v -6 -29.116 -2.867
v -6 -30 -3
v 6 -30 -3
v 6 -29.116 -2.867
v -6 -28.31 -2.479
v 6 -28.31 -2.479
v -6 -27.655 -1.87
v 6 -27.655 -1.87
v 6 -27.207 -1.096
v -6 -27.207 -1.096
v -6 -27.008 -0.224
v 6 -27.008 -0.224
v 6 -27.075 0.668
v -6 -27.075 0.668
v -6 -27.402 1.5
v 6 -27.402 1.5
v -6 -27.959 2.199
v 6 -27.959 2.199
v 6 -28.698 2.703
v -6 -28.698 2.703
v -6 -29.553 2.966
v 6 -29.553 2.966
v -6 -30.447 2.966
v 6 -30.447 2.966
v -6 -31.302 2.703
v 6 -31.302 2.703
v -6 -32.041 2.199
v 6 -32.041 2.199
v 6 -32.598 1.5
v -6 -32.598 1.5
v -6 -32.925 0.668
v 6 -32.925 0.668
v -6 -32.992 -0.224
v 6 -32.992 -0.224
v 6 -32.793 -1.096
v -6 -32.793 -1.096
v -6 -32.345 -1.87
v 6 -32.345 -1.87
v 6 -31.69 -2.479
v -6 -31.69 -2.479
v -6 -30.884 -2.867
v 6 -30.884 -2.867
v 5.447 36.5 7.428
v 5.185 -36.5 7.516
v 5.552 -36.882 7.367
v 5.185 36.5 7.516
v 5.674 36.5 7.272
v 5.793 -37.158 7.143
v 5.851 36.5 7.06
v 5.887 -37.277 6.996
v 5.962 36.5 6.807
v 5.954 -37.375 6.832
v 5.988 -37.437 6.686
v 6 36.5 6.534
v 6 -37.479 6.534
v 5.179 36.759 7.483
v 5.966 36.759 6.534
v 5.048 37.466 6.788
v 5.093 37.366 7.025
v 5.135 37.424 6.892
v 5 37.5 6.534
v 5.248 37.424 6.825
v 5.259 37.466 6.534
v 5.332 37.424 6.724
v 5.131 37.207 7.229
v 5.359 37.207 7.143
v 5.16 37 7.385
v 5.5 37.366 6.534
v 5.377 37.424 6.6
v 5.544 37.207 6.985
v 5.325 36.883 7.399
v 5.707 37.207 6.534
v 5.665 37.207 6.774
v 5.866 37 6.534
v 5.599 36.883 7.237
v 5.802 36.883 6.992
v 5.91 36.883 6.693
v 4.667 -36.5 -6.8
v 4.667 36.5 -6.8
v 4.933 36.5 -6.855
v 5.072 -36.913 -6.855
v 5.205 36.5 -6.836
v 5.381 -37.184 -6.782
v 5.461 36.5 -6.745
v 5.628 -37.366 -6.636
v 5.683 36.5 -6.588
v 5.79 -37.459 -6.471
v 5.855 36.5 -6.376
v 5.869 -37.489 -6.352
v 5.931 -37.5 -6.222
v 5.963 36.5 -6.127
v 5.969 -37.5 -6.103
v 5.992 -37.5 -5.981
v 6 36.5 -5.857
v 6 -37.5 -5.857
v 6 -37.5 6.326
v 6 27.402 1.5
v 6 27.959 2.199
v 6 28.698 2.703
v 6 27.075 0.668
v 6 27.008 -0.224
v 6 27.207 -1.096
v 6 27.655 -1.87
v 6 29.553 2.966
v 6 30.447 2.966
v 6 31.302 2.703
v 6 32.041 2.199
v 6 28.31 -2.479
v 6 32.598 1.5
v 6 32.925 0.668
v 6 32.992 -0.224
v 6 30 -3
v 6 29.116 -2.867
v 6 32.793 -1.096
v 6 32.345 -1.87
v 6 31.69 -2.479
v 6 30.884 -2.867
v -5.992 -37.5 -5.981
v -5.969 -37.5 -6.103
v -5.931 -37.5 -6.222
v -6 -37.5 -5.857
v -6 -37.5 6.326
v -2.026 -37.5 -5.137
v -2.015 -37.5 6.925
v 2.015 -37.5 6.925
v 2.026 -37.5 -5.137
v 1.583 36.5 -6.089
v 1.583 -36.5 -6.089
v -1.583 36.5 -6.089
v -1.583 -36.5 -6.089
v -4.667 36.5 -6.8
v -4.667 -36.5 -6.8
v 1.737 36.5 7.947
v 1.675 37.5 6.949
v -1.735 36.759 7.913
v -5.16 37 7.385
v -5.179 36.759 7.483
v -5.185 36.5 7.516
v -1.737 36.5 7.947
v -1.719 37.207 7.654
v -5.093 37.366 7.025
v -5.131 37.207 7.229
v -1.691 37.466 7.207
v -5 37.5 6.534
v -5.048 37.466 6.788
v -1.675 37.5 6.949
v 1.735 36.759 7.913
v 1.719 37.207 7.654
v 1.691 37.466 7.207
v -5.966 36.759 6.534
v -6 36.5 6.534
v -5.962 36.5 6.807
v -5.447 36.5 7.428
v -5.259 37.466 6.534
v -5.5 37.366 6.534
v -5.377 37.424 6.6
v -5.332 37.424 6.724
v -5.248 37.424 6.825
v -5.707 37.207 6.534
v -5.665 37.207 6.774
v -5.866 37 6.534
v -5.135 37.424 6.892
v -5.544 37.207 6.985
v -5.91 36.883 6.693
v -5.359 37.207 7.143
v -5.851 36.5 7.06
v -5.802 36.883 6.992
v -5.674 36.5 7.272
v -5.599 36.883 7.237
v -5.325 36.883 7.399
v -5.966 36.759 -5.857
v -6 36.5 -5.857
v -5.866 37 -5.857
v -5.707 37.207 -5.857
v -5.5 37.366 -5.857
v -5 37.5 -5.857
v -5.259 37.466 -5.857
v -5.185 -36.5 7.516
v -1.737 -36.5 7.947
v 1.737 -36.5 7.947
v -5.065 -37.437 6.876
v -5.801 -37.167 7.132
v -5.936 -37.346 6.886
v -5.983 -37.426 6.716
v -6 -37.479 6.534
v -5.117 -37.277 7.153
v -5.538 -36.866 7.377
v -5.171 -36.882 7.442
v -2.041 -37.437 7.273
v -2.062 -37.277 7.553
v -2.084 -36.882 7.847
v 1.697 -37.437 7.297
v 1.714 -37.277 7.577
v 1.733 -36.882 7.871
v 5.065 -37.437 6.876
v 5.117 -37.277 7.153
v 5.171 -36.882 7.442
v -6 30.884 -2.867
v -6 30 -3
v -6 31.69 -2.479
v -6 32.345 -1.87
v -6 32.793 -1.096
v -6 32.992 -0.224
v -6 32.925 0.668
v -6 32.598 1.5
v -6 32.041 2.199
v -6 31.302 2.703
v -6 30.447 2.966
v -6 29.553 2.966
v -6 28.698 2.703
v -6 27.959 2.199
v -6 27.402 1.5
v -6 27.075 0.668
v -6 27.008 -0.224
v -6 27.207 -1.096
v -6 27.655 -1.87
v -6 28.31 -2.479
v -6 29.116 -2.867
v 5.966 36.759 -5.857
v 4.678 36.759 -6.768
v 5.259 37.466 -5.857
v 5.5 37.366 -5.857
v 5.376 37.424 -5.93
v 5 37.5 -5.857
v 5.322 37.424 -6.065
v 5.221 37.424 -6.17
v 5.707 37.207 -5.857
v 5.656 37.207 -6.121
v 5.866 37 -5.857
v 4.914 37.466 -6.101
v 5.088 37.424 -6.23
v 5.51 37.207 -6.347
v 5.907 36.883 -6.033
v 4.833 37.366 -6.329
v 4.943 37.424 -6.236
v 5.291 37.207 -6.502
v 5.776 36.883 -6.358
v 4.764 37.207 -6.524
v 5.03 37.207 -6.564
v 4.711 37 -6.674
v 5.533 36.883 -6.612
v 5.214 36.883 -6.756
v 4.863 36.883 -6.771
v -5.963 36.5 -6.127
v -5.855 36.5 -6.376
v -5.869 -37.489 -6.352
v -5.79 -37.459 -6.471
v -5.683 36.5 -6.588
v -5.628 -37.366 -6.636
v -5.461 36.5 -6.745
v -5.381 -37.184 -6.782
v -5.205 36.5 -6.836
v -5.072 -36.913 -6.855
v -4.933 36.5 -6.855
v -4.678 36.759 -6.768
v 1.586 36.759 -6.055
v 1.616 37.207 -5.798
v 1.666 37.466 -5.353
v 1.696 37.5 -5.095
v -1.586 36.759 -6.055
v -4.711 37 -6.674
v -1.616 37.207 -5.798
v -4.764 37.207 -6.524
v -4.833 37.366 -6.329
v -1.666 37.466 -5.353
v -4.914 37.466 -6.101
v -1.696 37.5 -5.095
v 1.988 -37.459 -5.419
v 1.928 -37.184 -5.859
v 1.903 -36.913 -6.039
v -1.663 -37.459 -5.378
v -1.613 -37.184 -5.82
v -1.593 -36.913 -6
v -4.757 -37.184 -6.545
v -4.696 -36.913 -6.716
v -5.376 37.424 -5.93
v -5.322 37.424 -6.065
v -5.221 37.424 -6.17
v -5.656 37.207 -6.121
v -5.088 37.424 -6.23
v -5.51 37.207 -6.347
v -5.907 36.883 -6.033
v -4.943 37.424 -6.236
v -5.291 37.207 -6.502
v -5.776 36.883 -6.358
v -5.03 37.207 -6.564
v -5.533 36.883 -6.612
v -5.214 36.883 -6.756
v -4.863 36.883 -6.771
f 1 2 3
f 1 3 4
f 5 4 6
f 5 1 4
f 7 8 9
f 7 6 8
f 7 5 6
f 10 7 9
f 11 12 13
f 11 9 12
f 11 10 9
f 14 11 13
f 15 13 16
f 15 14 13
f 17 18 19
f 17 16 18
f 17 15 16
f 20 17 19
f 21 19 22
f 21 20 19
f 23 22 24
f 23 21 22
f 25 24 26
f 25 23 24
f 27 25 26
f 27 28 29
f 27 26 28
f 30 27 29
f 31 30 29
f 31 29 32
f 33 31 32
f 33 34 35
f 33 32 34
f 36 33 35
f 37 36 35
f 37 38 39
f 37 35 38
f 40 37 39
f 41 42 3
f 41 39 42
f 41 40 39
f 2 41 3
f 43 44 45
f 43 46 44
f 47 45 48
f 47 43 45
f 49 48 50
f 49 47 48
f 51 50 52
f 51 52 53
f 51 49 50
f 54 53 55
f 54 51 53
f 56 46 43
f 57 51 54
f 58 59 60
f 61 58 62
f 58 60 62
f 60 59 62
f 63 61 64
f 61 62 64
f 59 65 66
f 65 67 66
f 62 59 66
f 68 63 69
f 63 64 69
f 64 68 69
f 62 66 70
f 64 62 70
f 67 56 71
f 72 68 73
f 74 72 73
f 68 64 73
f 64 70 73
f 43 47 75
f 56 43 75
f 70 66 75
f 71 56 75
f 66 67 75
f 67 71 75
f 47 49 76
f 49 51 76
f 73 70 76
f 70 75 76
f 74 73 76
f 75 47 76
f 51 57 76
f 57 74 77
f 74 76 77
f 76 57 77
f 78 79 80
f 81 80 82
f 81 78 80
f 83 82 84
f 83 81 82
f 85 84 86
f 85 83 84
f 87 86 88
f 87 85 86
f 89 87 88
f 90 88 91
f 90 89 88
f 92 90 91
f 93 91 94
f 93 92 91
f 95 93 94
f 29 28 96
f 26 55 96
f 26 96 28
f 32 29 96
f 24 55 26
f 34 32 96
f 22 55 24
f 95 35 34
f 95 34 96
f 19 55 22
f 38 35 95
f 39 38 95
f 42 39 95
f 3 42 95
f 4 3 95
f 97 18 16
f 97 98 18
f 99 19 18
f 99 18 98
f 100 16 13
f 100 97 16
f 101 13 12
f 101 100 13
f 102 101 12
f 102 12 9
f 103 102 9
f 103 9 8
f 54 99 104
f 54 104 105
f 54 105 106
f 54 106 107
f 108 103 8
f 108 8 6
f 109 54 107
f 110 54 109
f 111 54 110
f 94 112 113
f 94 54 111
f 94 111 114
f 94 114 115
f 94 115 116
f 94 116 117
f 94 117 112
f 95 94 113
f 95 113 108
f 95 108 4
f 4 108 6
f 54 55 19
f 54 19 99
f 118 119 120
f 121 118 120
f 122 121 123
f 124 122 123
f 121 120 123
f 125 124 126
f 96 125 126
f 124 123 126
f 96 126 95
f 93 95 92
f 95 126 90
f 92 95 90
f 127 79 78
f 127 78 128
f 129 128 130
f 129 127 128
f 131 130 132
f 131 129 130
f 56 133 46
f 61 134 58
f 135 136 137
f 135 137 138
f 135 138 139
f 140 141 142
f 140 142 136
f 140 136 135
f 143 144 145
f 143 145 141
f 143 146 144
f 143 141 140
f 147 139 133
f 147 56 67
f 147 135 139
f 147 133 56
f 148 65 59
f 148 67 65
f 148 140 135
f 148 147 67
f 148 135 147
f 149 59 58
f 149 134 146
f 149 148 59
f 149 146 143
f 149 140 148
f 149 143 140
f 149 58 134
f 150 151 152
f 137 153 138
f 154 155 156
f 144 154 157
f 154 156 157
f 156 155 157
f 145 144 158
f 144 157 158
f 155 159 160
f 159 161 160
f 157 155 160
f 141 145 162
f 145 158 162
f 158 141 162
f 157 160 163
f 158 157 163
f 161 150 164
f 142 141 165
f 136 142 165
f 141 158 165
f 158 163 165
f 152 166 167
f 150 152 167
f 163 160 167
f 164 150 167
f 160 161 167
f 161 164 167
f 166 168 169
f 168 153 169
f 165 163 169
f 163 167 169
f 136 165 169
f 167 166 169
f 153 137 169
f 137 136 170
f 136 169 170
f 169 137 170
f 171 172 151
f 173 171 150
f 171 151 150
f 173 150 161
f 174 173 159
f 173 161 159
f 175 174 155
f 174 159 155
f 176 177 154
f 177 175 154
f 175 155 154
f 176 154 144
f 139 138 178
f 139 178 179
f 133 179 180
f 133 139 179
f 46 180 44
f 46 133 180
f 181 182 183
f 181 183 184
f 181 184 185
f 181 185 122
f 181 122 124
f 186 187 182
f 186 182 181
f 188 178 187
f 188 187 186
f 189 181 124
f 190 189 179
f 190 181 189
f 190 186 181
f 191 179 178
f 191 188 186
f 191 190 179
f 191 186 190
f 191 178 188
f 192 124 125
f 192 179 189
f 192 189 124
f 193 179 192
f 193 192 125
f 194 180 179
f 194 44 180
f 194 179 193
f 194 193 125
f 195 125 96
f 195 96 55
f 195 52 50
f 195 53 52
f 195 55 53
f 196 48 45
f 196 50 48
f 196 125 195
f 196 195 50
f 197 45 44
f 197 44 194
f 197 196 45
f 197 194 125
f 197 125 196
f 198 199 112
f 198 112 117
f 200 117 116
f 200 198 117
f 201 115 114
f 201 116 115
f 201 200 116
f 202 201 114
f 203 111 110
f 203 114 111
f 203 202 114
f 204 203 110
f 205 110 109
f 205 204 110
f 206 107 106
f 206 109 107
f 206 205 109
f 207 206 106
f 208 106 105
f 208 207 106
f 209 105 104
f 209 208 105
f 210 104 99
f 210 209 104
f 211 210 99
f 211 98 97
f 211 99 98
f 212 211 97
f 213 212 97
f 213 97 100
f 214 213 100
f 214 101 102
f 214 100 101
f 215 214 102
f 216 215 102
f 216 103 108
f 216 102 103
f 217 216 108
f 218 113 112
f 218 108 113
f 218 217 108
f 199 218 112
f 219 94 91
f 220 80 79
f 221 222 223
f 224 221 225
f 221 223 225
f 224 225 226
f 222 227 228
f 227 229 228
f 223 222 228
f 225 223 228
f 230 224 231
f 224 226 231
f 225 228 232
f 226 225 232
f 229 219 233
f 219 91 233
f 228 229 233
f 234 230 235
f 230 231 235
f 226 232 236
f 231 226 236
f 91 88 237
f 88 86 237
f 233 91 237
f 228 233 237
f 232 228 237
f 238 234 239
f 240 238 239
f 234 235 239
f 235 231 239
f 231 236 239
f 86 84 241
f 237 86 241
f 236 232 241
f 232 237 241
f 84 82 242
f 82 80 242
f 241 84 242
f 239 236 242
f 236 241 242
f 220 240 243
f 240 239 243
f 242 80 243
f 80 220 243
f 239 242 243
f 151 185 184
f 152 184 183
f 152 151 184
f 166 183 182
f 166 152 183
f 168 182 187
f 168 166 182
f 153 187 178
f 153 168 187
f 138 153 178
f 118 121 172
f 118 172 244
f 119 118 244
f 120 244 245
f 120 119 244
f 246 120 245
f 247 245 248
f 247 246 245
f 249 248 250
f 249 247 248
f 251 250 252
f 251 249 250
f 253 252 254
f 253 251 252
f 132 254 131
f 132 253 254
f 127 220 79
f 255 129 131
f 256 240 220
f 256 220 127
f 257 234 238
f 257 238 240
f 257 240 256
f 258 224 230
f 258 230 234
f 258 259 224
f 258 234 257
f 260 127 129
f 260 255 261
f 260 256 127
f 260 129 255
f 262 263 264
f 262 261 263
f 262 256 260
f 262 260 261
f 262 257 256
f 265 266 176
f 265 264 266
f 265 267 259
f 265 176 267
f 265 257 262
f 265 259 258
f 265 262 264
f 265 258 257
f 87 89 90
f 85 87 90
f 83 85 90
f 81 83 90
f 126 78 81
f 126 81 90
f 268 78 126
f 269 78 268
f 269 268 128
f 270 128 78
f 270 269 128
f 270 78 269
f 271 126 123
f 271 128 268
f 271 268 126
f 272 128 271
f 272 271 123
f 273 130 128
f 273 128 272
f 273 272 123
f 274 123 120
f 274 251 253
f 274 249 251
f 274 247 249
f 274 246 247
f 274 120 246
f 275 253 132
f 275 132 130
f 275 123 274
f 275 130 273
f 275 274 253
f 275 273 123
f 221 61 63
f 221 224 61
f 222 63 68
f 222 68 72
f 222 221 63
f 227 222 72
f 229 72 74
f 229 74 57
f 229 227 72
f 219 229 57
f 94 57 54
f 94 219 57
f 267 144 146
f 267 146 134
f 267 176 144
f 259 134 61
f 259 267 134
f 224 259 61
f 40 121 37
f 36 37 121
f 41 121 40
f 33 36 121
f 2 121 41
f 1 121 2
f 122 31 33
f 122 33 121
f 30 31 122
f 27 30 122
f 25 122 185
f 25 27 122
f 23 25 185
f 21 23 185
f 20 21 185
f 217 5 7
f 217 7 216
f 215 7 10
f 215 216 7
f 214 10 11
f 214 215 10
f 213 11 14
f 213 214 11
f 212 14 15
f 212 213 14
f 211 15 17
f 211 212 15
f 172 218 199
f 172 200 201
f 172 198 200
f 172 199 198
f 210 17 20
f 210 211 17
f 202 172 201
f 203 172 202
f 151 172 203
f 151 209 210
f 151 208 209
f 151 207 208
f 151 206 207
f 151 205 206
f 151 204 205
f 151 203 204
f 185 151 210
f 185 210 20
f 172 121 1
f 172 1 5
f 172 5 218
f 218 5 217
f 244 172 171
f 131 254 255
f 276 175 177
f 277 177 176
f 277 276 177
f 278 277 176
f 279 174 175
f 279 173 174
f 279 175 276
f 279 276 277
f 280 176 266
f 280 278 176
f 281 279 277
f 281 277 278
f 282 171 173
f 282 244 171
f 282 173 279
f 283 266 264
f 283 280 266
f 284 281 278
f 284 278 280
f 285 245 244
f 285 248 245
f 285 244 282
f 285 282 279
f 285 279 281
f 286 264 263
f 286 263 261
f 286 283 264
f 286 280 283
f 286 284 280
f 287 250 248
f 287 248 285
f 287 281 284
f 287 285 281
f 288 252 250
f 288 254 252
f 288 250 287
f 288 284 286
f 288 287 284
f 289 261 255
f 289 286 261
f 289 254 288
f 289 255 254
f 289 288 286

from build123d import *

# Parameters (mm, degrees)
BOSS_EXTRUDE1_DEPTH     = 37.5
CUT_EXTRUDE1_DEPTH      = 39.810570802
CUT_EXTRUDE1_DEPTH_BACK = 39.810570802
SKETCH2_R               = 3
FILLET1_R               = 1


with BuildPart() as part:
    # Sketch1 → Boss-Extrude1 (new, symmetric)
    with BuildSketch(Plane(origin=(0, 0, 0), x_dir=(1, 0, 0), z_dir=(0, 1, 0))):
        with BuildLine():
            Line((-6, 7.350239011), (-6, -7.350239011))
            ThreePointArc((-6, -7.350239011), (0, -8.000650348), (6, -7.350239011))
            Line((6, -7.350239011), (6, 7.350239011))
            ThreePointArc((6, 7.350239011), (0, 5.999349652), (-6, 7.350239011))
        make_face()
    extrude(amount=BOSS_EXTRUDE1_DEPTH, both=True)

    # Sketch2 → Cut-Extrude1 (cut, two sides: drawn at the far end of the back side and taken through both)
    with BuildSketch(Plane(origin=(0, 0, 0), x_dir=(0, 0, -1), z_dir=(1, 0, 0)).offset(-CUT_EXTRUDE1_DEPTH_BACK)):
        with Locations((0, 30)):
            Circle(SKETCH2_R)
        with Locations((0, -30)):
            Circle(SKETCH2_R)
    extrude(amount=CUT_EXTRUDE1_DEPTH + CUT_EXTRUDE1_DEPTH_BACK, mode=Mode.SUBTRACT)

    # Fillet1
    fillet1_edges = [part.edges().sort_by_distance(p)[0] for p in [
        (0, 37.5, 8.000650348),
        (6, 37.5, 0),
        (0, 37.5, -5.999349652),
        (0, -37.5, 8.000650348),
        (0, -37.5, -5.999349652),
        (6, 0, -7.350239011),
        (6, 0, 7.350239011),
        (-6, 0, 7.350239011),
        (-6, 0, -7.350239011),
        (-6, 37.5, 0),
    ]]
    fillet(fillet1_edges, radius=FILLET1_R)


solid = part.part
